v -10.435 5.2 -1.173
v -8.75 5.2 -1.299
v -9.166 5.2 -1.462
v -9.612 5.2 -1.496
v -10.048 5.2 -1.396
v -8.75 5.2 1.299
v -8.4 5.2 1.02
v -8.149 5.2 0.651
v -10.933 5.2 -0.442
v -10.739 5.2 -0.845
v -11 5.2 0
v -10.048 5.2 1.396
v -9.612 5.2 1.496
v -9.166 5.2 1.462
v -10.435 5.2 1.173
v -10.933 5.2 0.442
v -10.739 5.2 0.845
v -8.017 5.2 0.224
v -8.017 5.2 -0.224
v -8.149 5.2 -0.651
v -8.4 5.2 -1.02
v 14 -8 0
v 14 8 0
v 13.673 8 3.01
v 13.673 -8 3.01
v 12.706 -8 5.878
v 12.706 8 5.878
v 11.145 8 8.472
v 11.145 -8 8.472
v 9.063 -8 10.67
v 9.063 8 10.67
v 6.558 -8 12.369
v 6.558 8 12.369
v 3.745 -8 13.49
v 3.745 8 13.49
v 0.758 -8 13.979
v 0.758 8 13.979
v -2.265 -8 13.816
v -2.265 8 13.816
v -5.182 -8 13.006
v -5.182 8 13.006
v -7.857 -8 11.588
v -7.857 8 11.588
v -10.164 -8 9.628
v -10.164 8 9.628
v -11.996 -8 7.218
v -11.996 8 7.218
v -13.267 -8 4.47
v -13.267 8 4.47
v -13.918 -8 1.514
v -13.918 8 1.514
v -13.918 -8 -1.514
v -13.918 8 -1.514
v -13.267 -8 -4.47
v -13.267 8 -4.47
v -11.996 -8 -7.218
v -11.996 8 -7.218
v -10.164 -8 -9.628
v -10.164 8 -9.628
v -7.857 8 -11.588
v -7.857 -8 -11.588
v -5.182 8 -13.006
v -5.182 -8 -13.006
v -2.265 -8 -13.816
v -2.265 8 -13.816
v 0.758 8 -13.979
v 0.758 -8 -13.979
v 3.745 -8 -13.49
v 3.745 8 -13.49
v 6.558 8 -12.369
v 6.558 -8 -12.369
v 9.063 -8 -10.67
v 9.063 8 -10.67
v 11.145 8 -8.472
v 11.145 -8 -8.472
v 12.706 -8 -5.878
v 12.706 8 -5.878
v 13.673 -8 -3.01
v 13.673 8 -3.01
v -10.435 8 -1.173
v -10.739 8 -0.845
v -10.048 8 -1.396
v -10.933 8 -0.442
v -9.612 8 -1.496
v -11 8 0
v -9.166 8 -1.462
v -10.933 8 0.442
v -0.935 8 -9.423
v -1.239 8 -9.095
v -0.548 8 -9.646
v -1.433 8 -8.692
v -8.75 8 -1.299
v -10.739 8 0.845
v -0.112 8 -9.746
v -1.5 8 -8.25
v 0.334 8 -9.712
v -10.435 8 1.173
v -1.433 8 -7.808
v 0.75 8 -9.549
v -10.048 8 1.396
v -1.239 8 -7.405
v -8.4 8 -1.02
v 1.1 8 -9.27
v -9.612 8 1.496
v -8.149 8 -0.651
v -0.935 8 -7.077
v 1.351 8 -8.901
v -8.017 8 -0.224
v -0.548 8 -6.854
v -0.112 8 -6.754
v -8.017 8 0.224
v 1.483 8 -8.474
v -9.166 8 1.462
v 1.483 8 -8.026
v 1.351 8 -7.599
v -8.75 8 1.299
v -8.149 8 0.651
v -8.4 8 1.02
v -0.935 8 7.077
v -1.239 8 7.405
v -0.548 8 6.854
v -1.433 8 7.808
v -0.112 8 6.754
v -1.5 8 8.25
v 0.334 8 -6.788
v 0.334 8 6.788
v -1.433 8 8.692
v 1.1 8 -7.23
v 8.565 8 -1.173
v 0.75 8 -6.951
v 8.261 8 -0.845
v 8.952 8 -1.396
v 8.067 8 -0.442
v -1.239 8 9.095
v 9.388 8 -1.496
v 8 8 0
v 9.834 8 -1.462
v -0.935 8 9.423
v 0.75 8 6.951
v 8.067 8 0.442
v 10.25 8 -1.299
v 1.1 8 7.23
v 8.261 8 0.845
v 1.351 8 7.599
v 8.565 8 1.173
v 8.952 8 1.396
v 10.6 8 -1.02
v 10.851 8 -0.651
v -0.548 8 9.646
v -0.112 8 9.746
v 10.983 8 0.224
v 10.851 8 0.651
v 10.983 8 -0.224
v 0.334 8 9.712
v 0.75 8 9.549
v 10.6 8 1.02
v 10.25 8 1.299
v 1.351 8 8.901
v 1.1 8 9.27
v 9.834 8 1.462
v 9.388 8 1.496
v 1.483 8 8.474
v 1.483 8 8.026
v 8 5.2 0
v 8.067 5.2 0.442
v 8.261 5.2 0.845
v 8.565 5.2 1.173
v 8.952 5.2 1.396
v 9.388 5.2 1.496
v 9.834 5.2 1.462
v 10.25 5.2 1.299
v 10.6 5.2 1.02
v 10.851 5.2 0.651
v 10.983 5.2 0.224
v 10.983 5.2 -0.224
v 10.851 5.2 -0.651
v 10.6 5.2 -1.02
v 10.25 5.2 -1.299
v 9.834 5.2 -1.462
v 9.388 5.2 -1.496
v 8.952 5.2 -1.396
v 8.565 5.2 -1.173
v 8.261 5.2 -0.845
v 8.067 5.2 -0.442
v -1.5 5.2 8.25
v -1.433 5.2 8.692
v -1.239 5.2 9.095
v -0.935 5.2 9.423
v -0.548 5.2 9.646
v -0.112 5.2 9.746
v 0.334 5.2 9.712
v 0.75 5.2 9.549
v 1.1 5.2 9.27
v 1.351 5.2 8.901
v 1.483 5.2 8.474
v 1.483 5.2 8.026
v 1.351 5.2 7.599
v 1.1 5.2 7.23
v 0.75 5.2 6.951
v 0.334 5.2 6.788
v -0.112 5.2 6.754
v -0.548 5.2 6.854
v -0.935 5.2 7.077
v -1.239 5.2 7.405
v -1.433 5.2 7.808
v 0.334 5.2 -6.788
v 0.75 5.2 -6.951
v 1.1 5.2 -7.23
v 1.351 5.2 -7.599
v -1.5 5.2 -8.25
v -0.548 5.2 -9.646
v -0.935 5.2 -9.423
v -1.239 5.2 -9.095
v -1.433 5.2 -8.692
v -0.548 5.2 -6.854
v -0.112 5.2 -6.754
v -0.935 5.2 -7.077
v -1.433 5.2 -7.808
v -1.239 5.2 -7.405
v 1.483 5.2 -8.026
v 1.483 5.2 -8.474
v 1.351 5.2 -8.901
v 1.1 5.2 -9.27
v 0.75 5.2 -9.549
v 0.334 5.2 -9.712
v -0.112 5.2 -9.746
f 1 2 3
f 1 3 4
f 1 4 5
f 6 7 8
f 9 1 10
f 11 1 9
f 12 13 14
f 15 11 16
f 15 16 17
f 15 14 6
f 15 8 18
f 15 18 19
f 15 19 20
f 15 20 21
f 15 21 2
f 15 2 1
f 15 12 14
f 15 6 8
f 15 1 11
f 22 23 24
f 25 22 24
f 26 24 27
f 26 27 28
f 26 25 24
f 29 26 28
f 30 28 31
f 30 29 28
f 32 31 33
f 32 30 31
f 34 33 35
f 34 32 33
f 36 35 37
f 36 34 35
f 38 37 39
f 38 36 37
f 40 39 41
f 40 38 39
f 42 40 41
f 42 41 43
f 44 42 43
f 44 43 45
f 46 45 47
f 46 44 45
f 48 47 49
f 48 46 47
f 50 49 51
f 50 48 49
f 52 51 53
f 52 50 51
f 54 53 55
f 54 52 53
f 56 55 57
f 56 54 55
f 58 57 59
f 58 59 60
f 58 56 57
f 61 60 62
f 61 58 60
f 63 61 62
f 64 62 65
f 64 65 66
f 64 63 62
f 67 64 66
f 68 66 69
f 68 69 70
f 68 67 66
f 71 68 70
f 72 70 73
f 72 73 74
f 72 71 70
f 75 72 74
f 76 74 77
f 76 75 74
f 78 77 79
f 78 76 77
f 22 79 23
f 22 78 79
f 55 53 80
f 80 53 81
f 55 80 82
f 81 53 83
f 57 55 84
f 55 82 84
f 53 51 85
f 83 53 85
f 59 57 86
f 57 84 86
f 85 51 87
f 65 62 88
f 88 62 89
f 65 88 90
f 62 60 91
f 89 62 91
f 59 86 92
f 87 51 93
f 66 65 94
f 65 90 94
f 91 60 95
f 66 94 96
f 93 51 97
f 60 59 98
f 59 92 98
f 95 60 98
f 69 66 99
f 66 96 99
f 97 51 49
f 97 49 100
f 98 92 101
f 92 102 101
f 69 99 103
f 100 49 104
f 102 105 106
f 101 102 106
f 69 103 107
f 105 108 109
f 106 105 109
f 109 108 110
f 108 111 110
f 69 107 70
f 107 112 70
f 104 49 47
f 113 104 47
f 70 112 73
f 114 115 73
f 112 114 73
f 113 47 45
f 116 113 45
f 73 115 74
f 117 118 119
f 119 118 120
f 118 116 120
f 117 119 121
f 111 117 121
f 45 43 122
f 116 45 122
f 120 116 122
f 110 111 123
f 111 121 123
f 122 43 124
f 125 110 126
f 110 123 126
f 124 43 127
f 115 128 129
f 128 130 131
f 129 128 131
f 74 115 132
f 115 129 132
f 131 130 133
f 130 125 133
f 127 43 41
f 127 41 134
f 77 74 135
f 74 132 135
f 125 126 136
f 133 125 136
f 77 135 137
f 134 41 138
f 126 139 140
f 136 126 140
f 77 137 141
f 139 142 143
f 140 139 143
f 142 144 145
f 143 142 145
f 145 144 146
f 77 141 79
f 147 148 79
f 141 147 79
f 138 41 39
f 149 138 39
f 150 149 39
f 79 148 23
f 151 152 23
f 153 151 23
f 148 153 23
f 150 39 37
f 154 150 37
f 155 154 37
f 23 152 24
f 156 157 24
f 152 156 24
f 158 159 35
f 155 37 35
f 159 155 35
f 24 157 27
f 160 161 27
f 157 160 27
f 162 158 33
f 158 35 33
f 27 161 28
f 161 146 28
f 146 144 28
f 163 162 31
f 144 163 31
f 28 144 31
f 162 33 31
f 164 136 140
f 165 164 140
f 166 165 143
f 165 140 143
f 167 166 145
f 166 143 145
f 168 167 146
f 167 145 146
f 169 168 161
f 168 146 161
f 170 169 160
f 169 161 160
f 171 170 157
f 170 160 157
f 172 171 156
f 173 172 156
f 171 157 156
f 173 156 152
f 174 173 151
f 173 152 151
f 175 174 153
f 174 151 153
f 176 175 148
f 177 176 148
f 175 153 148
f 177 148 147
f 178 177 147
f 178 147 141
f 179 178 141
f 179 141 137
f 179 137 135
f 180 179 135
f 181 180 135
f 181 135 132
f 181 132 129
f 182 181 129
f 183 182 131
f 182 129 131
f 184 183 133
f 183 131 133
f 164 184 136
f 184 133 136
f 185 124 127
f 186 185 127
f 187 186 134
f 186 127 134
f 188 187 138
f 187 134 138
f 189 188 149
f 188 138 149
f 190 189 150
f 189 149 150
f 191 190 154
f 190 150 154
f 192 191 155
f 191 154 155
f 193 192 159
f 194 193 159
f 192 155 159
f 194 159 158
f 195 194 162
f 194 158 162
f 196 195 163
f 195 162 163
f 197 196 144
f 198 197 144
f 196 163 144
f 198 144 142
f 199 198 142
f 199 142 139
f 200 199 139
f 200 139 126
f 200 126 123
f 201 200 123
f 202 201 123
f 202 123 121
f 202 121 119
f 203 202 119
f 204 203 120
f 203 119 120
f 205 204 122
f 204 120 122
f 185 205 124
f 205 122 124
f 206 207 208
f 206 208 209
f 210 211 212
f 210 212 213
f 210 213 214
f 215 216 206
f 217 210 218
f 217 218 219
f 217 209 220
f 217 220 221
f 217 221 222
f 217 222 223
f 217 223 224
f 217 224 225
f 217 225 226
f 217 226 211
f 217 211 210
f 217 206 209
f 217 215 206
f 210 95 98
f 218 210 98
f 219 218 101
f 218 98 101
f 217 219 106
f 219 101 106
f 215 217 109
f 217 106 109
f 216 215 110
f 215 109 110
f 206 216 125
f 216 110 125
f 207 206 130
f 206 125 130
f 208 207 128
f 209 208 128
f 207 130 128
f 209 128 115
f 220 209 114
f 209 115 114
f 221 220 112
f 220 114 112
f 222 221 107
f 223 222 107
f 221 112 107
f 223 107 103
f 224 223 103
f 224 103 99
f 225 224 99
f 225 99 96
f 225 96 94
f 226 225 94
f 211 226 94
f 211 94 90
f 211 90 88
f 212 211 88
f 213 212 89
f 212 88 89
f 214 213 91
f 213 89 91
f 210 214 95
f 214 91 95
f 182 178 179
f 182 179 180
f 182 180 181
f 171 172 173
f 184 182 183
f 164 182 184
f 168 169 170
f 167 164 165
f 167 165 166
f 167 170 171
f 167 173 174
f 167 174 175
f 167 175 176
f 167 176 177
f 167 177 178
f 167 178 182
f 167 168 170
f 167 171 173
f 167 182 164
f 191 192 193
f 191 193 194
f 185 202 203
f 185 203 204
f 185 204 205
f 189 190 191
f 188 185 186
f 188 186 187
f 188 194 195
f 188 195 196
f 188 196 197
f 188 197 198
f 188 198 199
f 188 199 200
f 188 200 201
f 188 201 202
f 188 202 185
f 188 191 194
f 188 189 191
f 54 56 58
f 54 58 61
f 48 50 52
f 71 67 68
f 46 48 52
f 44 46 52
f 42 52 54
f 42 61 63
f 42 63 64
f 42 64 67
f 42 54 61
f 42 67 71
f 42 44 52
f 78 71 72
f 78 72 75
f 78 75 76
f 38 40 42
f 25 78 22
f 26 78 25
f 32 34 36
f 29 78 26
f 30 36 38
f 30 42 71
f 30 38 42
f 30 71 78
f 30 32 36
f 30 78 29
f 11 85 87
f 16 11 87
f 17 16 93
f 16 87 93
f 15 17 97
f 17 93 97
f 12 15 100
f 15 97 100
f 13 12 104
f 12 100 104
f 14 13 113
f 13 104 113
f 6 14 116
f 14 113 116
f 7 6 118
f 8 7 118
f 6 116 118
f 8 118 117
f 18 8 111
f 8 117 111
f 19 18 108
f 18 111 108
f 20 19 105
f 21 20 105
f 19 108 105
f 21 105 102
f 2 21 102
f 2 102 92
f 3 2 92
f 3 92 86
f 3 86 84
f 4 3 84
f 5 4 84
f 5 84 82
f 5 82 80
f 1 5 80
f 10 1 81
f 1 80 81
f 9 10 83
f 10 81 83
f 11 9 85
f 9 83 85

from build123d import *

# Parameters (mm, degrees)
F0_R     = 14
F1_DEPTH = 8
F2_R     = 1.5
F3_DEPTH = 2.8


with BuildPart() as f1:
    # F0 (on Front) → F1 (new body, symmetric)
    with BuildSketch(Plane.XZ):
        Circle(F0_R)
    extrude(amount=F1_DEPTH, both=True)

    # F2 (on face) → F3 (cut)
    with BuildSketch(Plane(origin=(0, 8, 0), x_dir=(-1, 0, 0), z_dir=(0, 1, 0))):
        with Locations((0, 8.25)):
            Circle(F2_R)
        with Locations((0, -8.25)):
            Circle(F2_R)
        with Locations((9.5, 0)):
            Circle(F2_R)
        with Locations((-9.5, 0)):
            Circle(F2_R)
    extrude(amount=-F3_DEPTH, mode=Mode.SUBTRACT)


solid = f1.part
